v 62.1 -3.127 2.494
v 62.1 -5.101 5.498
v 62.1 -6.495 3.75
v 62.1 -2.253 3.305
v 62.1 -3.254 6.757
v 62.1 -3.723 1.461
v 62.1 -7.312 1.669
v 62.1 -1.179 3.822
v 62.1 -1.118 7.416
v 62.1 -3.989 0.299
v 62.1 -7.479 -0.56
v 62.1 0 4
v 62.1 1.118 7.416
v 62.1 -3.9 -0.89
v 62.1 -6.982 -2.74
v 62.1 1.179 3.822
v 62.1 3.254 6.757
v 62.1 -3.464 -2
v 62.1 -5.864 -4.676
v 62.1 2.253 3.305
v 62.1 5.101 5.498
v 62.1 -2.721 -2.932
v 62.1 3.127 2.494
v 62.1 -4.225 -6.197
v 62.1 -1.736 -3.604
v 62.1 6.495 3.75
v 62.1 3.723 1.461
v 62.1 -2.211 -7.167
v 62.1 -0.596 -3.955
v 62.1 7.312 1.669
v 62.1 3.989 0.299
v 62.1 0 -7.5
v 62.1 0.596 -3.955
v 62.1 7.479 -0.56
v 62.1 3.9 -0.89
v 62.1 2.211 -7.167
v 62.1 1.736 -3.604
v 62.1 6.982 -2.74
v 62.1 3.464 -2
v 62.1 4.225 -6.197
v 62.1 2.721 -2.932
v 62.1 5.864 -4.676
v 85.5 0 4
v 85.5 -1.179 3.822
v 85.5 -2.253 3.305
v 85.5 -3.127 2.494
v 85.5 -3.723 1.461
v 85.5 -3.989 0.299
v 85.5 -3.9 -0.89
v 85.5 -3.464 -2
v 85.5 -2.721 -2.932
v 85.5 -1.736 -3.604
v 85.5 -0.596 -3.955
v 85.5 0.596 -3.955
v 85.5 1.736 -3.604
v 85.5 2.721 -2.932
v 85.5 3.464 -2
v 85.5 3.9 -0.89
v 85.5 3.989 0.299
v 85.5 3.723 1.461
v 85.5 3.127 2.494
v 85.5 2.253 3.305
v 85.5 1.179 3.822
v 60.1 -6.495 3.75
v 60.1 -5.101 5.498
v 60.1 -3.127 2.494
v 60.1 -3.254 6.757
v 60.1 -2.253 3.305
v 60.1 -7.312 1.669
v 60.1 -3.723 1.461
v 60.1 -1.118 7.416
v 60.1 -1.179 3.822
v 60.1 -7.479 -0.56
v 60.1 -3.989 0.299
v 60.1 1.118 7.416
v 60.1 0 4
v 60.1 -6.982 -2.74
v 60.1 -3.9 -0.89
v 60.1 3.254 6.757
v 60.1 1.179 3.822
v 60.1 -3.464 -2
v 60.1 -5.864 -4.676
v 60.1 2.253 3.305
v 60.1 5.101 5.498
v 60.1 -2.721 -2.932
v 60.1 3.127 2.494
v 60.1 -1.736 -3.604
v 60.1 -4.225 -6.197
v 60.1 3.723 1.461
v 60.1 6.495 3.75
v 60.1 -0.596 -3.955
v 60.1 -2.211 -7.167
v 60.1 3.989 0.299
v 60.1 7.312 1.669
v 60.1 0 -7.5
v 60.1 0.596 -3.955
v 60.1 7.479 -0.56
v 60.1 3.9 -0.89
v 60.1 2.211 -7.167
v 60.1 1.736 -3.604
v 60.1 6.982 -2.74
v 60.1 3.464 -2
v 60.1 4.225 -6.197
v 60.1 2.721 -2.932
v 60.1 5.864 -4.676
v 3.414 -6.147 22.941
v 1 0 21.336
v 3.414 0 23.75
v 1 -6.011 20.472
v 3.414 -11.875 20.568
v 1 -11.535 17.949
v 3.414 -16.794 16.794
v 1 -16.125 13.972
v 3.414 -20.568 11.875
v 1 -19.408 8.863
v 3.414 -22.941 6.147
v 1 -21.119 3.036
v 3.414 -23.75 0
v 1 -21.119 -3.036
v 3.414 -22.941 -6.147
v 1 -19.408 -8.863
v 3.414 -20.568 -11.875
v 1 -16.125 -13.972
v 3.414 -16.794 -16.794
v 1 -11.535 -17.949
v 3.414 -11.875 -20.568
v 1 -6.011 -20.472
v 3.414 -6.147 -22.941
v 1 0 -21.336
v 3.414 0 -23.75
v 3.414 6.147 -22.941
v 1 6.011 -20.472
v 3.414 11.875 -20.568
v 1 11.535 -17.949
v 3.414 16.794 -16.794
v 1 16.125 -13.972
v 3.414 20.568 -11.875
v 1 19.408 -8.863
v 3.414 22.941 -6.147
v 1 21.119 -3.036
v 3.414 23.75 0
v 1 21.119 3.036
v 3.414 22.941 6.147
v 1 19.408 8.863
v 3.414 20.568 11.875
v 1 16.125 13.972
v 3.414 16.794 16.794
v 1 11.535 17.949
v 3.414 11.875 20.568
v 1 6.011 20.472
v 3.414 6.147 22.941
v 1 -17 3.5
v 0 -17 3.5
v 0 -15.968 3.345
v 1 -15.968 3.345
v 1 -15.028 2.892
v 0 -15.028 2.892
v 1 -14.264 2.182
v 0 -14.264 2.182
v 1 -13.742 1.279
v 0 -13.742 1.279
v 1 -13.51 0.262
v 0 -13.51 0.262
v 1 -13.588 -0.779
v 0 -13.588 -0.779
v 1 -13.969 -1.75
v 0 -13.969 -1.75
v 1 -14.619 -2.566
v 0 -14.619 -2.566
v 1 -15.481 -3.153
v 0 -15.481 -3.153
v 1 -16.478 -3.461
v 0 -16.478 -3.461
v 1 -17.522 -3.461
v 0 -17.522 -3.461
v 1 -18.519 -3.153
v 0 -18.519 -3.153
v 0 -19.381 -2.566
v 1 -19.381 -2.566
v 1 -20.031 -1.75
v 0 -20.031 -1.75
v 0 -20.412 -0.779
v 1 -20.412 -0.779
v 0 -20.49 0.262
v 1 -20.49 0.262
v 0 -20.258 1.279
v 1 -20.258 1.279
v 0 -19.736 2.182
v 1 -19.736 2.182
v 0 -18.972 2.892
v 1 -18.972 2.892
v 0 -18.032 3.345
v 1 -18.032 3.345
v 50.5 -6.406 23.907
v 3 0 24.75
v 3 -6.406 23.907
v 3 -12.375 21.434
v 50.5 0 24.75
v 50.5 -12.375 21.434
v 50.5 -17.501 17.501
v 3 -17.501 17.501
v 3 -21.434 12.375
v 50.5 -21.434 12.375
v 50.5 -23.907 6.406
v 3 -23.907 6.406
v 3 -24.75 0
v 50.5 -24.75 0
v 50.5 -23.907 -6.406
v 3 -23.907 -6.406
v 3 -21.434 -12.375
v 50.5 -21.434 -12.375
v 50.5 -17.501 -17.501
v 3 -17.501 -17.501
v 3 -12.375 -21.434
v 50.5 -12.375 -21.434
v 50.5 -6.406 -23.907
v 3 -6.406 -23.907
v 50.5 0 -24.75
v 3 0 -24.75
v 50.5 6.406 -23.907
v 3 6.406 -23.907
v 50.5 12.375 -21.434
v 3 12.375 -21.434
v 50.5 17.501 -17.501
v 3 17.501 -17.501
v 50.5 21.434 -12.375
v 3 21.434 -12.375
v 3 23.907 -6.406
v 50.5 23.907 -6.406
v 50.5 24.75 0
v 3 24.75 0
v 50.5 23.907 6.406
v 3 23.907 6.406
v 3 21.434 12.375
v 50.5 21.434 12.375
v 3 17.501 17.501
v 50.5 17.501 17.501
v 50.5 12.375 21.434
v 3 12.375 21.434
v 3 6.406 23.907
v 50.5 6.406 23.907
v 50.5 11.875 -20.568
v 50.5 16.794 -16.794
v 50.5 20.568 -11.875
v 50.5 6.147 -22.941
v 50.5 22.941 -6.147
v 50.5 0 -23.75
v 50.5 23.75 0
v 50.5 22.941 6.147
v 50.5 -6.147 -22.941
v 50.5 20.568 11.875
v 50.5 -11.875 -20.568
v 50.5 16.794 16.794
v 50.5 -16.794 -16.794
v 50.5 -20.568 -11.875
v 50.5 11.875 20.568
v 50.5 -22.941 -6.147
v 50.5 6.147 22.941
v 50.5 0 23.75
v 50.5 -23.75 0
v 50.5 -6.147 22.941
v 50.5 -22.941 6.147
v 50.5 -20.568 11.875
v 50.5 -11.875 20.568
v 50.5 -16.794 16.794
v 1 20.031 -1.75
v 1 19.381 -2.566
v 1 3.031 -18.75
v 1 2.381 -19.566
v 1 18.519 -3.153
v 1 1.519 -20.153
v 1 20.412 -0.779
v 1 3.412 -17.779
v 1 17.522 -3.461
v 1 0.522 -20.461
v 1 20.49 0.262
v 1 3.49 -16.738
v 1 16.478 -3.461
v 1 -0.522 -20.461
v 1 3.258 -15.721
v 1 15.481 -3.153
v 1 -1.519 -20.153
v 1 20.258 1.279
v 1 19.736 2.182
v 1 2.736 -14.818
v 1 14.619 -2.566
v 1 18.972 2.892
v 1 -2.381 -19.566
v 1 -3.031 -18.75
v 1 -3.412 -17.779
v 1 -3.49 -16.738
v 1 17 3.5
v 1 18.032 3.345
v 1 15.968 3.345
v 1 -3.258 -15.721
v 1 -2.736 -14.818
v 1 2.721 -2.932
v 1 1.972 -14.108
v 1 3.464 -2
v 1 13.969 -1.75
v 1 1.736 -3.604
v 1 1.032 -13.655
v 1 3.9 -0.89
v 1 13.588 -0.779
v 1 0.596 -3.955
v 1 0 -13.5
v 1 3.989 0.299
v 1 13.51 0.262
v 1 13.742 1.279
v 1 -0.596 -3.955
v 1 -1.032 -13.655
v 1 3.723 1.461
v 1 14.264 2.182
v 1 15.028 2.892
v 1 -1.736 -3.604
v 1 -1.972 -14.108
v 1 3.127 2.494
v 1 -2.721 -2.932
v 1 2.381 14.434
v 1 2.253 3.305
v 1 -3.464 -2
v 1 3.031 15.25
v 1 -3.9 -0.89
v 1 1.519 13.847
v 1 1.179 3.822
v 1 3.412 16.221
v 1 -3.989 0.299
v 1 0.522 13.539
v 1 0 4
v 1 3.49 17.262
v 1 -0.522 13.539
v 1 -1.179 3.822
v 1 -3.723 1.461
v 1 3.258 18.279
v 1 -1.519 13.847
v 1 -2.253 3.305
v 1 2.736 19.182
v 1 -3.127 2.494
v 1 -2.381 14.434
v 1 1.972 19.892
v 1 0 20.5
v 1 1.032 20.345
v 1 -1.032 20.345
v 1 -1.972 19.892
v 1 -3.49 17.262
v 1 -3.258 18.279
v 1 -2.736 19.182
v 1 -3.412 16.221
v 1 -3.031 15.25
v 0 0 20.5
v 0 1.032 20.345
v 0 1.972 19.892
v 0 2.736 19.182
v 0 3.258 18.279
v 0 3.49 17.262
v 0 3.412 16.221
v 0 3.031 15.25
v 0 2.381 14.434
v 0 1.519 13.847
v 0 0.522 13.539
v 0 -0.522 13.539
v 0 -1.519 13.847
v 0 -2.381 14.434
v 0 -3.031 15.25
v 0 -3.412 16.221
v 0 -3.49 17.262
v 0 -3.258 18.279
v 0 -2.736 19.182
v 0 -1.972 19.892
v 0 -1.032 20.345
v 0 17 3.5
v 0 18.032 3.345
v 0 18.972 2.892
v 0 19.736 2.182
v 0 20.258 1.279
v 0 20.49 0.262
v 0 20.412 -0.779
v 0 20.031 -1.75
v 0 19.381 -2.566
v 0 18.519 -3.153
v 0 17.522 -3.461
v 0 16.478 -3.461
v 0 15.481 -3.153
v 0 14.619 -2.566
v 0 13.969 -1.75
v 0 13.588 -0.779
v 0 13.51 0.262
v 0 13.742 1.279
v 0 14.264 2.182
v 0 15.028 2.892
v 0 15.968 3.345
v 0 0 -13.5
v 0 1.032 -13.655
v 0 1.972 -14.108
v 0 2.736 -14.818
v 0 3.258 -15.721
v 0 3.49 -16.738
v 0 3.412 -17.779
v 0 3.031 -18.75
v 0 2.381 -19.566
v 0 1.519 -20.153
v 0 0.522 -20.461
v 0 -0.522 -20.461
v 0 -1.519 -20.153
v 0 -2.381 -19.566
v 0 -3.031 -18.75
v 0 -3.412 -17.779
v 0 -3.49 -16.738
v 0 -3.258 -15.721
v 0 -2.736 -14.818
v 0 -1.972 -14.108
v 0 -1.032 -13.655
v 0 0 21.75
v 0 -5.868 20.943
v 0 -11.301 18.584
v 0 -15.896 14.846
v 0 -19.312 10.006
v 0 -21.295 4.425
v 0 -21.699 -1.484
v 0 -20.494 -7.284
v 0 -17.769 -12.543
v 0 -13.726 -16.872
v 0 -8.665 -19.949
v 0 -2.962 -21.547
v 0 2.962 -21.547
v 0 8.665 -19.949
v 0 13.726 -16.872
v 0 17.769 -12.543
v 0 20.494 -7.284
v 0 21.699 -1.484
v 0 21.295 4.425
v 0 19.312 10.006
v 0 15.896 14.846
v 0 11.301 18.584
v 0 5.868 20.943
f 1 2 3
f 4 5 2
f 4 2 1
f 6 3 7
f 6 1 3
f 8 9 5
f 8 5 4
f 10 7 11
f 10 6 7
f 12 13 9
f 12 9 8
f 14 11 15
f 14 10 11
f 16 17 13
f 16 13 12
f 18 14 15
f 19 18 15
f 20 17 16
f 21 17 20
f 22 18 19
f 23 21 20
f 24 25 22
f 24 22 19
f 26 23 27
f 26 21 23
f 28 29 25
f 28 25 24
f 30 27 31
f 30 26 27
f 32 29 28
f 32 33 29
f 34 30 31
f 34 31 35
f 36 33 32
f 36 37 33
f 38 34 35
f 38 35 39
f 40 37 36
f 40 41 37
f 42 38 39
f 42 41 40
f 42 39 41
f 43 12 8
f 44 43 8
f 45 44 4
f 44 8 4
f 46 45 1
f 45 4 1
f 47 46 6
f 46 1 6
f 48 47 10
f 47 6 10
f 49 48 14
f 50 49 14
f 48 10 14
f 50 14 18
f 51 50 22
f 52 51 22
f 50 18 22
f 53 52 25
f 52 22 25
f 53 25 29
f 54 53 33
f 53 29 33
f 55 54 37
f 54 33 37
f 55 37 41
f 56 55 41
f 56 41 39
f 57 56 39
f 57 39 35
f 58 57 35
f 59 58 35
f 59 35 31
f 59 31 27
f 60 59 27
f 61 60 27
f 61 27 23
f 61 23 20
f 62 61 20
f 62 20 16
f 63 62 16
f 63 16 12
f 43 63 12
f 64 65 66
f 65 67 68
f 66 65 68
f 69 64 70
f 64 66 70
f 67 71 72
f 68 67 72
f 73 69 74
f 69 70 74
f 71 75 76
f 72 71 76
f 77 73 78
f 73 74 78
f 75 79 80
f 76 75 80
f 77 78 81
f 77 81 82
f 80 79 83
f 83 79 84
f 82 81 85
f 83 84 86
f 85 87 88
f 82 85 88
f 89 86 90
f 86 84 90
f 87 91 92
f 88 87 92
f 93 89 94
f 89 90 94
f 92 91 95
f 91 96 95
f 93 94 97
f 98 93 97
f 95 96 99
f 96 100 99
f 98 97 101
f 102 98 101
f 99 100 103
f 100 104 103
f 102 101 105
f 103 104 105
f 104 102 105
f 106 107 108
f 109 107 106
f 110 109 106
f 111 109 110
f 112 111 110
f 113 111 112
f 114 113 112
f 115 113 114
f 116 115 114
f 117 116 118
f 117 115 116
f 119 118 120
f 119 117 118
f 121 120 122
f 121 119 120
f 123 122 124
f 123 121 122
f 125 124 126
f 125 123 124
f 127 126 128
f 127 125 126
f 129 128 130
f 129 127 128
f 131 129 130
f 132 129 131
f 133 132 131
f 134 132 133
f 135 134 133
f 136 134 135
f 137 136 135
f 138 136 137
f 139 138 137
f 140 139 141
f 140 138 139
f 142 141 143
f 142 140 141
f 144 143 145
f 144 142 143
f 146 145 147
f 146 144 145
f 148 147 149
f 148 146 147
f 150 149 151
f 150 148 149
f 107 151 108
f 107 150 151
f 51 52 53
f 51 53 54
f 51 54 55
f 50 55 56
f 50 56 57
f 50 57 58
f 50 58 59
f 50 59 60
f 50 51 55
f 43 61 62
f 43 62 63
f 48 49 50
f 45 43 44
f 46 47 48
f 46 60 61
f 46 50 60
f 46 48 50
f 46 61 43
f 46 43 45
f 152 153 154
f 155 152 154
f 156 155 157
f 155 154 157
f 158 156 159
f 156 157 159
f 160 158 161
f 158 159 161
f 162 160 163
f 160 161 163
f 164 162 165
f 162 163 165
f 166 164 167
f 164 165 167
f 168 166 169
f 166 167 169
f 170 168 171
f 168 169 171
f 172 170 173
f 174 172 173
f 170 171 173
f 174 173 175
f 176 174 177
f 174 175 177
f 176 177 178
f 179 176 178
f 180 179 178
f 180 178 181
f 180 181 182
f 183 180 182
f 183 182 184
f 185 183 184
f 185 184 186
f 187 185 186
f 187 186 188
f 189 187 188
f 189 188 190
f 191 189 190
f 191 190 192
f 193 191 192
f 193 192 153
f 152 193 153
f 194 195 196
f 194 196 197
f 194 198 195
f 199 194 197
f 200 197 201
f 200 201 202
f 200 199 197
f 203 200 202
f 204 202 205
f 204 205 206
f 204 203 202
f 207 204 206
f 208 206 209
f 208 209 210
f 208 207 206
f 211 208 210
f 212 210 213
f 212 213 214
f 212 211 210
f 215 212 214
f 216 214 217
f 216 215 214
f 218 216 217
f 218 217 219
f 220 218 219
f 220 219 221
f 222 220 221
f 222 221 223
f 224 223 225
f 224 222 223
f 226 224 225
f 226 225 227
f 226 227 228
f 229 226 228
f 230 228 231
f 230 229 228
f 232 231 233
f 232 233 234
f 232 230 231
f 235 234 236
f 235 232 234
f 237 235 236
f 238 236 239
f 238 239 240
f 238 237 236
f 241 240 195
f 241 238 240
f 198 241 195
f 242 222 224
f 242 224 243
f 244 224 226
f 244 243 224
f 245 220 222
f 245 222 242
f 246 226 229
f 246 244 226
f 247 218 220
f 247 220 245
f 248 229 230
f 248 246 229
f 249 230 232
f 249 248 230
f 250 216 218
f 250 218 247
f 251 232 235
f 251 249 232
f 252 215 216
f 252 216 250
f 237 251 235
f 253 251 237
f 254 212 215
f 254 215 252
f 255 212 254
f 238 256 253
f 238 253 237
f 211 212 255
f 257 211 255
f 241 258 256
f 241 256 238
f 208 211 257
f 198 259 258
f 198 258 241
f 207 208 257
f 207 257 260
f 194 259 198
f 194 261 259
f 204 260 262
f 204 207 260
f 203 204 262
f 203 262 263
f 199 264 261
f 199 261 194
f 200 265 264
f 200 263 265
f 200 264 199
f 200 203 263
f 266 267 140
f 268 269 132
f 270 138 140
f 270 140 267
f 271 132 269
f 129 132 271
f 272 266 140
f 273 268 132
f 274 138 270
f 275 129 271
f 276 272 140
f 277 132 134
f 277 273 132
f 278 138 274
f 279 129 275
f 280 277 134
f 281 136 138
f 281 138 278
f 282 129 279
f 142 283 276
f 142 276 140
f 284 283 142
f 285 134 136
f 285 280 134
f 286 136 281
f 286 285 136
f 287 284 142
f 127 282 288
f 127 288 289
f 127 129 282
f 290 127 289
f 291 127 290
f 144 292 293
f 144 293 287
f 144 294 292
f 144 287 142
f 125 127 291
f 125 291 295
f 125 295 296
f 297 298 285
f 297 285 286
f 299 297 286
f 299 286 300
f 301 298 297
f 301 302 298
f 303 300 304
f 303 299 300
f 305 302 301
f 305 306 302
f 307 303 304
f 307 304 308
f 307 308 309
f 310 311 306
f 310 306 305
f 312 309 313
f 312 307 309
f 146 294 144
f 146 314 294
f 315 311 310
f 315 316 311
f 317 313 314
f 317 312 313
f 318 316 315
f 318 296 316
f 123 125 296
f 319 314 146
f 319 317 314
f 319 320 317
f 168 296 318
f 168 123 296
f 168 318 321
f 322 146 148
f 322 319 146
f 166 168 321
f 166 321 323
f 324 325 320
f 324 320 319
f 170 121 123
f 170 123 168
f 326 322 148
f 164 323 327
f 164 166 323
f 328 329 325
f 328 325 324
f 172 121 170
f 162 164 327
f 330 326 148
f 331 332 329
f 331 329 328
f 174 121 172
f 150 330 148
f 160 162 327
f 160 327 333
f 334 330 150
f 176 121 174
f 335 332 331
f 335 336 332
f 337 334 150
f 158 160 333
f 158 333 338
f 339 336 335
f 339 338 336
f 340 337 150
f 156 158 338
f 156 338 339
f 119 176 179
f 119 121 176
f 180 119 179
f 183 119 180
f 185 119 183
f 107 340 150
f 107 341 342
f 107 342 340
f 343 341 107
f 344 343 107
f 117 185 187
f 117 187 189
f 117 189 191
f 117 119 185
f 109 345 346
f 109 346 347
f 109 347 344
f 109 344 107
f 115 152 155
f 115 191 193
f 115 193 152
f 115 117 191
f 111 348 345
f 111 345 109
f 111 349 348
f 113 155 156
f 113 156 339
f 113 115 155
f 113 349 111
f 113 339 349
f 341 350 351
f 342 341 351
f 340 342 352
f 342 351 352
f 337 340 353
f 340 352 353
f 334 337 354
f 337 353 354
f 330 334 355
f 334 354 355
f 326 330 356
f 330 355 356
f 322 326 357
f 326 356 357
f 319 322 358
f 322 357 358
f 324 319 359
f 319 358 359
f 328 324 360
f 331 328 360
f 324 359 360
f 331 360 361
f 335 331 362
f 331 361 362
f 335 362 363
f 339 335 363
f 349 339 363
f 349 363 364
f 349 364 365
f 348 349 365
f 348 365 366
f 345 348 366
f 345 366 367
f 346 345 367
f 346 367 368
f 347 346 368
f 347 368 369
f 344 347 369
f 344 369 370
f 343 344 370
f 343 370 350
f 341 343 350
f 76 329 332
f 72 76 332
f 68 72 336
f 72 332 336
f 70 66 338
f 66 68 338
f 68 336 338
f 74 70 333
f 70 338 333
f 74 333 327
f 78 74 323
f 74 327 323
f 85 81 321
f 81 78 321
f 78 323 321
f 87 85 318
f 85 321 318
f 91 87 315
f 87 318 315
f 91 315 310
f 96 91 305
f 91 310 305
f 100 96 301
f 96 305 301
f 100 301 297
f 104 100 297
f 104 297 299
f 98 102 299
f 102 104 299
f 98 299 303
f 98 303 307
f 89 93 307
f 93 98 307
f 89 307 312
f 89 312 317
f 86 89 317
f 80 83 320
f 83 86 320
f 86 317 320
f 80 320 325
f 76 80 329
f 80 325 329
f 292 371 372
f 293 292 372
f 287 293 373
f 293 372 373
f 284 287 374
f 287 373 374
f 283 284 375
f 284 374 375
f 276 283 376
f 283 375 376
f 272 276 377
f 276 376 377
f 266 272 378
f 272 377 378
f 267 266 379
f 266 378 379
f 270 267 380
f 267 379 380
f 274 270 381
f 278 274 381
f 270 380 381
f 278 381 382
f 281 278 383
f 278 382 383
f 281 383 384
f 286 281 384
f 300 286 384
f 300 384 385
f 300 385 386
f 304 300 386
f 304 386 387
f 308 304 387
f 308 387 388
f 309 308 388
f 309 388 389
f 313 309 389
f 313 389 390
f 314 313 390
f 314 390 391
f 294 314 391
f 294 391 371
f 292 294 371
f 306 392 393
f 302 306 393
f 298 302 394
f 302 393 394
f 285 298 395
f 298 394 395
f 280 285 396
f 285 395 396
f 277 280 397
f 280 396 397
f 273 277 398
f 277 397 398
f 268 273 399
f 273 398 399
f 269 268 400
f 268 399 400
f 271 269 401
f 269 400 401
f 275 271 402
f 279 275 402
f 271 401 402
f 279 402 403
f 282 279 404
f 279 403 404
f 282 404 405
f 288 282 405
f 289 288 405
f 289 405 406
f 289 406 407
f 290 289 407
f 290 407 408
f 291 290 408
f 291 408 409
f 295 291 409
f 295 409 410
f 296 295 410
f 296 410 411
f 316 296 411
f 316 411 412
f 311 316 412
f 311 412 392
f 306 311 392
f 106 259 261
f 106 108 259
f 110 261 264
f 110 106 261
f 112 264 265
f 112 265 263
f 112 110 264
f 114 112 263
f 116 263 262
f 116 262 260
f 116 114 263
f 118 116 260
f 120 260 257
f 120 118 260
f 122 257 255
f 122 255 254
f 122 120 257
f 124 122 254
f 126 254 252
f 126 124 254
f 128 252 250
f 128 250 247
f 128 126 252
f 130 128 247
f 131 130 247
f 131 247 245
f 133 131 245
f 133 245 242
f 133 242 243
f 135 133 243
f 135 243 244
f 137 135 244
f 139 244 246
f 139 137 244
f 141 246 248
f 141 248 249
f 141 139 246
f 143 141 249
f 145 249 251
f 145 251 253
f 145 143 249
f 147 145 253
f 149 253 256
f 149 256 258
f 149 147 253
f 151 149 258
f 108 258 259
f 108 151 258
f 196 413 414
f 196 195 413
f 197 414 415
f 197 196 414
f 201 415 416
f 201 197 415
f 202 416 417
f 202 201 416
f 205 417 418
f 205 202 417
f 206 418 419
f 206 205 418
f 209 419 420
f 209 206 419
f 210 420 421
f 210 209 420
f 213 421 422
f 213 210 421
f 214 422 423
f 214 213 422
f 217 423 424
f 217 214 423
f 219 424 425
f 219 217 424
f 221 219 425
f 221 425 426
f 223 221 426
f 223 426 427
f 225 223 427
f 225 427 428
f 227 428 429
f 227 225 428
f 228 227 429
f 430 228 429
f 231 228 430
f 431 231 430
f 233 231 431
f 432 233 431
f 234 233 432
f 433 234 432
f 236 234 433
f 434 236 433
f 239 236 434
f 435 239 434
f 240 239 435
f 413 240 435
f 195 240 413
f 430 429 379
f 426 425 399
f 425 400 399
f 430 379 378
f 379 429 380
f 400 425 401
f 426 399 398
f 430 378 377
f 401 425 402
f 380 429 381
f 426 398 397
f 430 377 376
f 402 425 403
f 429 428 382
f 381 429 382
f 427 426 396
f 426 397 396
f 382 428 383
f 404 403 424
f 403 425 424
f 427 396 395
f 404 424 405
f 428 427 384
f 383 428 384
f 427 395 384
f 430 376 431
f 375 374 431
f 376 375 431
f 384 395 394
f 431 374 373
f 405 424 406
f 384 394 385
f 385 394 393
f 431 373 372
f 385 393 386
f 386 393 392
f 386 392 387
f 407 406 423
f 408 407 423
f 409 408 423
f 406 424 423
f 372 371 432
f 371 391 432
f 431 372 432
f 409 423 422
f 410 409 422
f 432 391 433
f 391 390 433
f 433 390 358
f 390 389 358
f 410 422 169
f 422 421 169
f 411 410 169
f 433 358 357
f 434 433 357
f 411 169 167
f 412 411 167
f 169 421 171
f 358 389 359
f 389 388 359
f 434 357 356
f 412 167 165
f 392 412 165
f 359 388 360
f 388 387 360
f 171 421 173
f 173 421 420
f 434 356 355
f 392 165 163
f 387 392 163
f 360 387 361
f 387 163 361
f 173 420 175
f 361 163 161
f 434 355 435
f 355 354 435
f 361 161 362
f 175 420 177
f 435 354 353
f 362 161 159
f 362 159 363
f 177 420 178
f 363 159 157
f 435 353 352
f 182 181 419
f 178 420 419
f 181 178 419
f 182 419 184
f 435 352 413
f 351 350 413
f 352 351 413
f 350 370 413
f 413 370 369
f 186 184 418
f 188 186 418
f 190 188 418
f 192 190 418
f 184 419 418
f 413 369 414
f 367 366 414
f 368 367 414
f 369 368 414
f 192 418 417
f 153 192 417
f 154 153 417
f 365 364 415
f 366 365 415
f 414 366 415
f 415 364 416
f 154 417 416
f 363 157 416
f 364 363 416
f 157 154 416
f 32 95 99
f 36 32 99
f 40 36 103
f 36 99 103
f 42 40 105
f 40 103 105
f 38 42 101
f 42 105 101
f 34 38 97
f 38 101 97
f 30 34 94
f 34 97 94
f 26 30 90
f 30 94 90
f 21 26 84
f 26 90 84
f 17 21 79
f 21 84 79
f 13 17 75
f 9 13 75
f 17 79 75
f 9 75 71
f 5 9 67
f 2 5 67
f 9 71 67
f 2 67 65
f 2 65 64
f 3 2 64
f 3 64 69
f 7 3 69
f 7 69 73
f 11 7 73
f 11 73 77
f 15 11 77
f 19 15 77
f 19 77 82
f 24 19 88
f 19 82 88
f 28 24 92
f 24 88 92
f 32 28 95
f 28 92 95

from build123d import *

# Parameters (mm, degrees)
SKETCH2_R           = 4
BOSS_EXTRUDE1_DEPTH = 85.5
SKETCH3_R           = 3.5
CUT_EXTRUDE1_DEPTH  = 93.387093254
SKETCH4_R           = 7.5
BOSS_EXTRUDE2_DEPTH = 2


with BuildPart() as part:
    # Sketch1 → Revolve1 (revolve)
    with BuildSketch(Plane.XY, mode=Mode.PRIVATE) as revolve1_sk:
        Polygon((0, 21.75), (3, 24.75), (50.5, 24.75), (50.5, 23.75), (3.414213562, 23.75), (1, 21.335786438), (1, 0), (0, 0), align=None)
    revolve(revolve1_sk.sketch.rotate(Axis((0, 0, 0), (1, 0, 0)), 90), axis=Axis((0, 0, 0), (1, 0, 0)))

    # Sketch2 → Boss-Extrude1 (add)
    with BuildSketch(Plane(origin=(0, 0, 0), x_dir=(0, 0, -1), z_dir=(1, 0, 0))):
        with Locations(Location((0, 0, 0), (0, 0, 180))):
            Circle(SKETCH2_R)
    extrude(amount=BOSS_EXTRUDE1_DEPTH)

    # Sketch3 → Cut-Extrude1 (cut, through all)
    with BuildSketch(Plane.ZY):
        with Locations((0, 17)):
            Circle(SKETCH3_R)
        with Locations((17, 0)):
            Circle(SKETCH3_R)
        with Locations((0, -17)):
            Circle(SKETCH3_R)
        with Locations((-17, 0)):
            Circle(SKETCH3_R)
    extrude(amount=-CUT_EXTRUDE1_DEPTH, mode=Mode.SUBTRACT)

    # Sketch4 → Boss-Extrude2 (add)
    with BuildSketch(Plane(origin=(60.1, 0, 0), x_dir=(0, 0, -1), z_dir=(1, 0, 0))):
        Circle(SKETCH4_R)
    extrude(amount=BOSS_EXTRUDE2_DEPTH)


solid = part.part
